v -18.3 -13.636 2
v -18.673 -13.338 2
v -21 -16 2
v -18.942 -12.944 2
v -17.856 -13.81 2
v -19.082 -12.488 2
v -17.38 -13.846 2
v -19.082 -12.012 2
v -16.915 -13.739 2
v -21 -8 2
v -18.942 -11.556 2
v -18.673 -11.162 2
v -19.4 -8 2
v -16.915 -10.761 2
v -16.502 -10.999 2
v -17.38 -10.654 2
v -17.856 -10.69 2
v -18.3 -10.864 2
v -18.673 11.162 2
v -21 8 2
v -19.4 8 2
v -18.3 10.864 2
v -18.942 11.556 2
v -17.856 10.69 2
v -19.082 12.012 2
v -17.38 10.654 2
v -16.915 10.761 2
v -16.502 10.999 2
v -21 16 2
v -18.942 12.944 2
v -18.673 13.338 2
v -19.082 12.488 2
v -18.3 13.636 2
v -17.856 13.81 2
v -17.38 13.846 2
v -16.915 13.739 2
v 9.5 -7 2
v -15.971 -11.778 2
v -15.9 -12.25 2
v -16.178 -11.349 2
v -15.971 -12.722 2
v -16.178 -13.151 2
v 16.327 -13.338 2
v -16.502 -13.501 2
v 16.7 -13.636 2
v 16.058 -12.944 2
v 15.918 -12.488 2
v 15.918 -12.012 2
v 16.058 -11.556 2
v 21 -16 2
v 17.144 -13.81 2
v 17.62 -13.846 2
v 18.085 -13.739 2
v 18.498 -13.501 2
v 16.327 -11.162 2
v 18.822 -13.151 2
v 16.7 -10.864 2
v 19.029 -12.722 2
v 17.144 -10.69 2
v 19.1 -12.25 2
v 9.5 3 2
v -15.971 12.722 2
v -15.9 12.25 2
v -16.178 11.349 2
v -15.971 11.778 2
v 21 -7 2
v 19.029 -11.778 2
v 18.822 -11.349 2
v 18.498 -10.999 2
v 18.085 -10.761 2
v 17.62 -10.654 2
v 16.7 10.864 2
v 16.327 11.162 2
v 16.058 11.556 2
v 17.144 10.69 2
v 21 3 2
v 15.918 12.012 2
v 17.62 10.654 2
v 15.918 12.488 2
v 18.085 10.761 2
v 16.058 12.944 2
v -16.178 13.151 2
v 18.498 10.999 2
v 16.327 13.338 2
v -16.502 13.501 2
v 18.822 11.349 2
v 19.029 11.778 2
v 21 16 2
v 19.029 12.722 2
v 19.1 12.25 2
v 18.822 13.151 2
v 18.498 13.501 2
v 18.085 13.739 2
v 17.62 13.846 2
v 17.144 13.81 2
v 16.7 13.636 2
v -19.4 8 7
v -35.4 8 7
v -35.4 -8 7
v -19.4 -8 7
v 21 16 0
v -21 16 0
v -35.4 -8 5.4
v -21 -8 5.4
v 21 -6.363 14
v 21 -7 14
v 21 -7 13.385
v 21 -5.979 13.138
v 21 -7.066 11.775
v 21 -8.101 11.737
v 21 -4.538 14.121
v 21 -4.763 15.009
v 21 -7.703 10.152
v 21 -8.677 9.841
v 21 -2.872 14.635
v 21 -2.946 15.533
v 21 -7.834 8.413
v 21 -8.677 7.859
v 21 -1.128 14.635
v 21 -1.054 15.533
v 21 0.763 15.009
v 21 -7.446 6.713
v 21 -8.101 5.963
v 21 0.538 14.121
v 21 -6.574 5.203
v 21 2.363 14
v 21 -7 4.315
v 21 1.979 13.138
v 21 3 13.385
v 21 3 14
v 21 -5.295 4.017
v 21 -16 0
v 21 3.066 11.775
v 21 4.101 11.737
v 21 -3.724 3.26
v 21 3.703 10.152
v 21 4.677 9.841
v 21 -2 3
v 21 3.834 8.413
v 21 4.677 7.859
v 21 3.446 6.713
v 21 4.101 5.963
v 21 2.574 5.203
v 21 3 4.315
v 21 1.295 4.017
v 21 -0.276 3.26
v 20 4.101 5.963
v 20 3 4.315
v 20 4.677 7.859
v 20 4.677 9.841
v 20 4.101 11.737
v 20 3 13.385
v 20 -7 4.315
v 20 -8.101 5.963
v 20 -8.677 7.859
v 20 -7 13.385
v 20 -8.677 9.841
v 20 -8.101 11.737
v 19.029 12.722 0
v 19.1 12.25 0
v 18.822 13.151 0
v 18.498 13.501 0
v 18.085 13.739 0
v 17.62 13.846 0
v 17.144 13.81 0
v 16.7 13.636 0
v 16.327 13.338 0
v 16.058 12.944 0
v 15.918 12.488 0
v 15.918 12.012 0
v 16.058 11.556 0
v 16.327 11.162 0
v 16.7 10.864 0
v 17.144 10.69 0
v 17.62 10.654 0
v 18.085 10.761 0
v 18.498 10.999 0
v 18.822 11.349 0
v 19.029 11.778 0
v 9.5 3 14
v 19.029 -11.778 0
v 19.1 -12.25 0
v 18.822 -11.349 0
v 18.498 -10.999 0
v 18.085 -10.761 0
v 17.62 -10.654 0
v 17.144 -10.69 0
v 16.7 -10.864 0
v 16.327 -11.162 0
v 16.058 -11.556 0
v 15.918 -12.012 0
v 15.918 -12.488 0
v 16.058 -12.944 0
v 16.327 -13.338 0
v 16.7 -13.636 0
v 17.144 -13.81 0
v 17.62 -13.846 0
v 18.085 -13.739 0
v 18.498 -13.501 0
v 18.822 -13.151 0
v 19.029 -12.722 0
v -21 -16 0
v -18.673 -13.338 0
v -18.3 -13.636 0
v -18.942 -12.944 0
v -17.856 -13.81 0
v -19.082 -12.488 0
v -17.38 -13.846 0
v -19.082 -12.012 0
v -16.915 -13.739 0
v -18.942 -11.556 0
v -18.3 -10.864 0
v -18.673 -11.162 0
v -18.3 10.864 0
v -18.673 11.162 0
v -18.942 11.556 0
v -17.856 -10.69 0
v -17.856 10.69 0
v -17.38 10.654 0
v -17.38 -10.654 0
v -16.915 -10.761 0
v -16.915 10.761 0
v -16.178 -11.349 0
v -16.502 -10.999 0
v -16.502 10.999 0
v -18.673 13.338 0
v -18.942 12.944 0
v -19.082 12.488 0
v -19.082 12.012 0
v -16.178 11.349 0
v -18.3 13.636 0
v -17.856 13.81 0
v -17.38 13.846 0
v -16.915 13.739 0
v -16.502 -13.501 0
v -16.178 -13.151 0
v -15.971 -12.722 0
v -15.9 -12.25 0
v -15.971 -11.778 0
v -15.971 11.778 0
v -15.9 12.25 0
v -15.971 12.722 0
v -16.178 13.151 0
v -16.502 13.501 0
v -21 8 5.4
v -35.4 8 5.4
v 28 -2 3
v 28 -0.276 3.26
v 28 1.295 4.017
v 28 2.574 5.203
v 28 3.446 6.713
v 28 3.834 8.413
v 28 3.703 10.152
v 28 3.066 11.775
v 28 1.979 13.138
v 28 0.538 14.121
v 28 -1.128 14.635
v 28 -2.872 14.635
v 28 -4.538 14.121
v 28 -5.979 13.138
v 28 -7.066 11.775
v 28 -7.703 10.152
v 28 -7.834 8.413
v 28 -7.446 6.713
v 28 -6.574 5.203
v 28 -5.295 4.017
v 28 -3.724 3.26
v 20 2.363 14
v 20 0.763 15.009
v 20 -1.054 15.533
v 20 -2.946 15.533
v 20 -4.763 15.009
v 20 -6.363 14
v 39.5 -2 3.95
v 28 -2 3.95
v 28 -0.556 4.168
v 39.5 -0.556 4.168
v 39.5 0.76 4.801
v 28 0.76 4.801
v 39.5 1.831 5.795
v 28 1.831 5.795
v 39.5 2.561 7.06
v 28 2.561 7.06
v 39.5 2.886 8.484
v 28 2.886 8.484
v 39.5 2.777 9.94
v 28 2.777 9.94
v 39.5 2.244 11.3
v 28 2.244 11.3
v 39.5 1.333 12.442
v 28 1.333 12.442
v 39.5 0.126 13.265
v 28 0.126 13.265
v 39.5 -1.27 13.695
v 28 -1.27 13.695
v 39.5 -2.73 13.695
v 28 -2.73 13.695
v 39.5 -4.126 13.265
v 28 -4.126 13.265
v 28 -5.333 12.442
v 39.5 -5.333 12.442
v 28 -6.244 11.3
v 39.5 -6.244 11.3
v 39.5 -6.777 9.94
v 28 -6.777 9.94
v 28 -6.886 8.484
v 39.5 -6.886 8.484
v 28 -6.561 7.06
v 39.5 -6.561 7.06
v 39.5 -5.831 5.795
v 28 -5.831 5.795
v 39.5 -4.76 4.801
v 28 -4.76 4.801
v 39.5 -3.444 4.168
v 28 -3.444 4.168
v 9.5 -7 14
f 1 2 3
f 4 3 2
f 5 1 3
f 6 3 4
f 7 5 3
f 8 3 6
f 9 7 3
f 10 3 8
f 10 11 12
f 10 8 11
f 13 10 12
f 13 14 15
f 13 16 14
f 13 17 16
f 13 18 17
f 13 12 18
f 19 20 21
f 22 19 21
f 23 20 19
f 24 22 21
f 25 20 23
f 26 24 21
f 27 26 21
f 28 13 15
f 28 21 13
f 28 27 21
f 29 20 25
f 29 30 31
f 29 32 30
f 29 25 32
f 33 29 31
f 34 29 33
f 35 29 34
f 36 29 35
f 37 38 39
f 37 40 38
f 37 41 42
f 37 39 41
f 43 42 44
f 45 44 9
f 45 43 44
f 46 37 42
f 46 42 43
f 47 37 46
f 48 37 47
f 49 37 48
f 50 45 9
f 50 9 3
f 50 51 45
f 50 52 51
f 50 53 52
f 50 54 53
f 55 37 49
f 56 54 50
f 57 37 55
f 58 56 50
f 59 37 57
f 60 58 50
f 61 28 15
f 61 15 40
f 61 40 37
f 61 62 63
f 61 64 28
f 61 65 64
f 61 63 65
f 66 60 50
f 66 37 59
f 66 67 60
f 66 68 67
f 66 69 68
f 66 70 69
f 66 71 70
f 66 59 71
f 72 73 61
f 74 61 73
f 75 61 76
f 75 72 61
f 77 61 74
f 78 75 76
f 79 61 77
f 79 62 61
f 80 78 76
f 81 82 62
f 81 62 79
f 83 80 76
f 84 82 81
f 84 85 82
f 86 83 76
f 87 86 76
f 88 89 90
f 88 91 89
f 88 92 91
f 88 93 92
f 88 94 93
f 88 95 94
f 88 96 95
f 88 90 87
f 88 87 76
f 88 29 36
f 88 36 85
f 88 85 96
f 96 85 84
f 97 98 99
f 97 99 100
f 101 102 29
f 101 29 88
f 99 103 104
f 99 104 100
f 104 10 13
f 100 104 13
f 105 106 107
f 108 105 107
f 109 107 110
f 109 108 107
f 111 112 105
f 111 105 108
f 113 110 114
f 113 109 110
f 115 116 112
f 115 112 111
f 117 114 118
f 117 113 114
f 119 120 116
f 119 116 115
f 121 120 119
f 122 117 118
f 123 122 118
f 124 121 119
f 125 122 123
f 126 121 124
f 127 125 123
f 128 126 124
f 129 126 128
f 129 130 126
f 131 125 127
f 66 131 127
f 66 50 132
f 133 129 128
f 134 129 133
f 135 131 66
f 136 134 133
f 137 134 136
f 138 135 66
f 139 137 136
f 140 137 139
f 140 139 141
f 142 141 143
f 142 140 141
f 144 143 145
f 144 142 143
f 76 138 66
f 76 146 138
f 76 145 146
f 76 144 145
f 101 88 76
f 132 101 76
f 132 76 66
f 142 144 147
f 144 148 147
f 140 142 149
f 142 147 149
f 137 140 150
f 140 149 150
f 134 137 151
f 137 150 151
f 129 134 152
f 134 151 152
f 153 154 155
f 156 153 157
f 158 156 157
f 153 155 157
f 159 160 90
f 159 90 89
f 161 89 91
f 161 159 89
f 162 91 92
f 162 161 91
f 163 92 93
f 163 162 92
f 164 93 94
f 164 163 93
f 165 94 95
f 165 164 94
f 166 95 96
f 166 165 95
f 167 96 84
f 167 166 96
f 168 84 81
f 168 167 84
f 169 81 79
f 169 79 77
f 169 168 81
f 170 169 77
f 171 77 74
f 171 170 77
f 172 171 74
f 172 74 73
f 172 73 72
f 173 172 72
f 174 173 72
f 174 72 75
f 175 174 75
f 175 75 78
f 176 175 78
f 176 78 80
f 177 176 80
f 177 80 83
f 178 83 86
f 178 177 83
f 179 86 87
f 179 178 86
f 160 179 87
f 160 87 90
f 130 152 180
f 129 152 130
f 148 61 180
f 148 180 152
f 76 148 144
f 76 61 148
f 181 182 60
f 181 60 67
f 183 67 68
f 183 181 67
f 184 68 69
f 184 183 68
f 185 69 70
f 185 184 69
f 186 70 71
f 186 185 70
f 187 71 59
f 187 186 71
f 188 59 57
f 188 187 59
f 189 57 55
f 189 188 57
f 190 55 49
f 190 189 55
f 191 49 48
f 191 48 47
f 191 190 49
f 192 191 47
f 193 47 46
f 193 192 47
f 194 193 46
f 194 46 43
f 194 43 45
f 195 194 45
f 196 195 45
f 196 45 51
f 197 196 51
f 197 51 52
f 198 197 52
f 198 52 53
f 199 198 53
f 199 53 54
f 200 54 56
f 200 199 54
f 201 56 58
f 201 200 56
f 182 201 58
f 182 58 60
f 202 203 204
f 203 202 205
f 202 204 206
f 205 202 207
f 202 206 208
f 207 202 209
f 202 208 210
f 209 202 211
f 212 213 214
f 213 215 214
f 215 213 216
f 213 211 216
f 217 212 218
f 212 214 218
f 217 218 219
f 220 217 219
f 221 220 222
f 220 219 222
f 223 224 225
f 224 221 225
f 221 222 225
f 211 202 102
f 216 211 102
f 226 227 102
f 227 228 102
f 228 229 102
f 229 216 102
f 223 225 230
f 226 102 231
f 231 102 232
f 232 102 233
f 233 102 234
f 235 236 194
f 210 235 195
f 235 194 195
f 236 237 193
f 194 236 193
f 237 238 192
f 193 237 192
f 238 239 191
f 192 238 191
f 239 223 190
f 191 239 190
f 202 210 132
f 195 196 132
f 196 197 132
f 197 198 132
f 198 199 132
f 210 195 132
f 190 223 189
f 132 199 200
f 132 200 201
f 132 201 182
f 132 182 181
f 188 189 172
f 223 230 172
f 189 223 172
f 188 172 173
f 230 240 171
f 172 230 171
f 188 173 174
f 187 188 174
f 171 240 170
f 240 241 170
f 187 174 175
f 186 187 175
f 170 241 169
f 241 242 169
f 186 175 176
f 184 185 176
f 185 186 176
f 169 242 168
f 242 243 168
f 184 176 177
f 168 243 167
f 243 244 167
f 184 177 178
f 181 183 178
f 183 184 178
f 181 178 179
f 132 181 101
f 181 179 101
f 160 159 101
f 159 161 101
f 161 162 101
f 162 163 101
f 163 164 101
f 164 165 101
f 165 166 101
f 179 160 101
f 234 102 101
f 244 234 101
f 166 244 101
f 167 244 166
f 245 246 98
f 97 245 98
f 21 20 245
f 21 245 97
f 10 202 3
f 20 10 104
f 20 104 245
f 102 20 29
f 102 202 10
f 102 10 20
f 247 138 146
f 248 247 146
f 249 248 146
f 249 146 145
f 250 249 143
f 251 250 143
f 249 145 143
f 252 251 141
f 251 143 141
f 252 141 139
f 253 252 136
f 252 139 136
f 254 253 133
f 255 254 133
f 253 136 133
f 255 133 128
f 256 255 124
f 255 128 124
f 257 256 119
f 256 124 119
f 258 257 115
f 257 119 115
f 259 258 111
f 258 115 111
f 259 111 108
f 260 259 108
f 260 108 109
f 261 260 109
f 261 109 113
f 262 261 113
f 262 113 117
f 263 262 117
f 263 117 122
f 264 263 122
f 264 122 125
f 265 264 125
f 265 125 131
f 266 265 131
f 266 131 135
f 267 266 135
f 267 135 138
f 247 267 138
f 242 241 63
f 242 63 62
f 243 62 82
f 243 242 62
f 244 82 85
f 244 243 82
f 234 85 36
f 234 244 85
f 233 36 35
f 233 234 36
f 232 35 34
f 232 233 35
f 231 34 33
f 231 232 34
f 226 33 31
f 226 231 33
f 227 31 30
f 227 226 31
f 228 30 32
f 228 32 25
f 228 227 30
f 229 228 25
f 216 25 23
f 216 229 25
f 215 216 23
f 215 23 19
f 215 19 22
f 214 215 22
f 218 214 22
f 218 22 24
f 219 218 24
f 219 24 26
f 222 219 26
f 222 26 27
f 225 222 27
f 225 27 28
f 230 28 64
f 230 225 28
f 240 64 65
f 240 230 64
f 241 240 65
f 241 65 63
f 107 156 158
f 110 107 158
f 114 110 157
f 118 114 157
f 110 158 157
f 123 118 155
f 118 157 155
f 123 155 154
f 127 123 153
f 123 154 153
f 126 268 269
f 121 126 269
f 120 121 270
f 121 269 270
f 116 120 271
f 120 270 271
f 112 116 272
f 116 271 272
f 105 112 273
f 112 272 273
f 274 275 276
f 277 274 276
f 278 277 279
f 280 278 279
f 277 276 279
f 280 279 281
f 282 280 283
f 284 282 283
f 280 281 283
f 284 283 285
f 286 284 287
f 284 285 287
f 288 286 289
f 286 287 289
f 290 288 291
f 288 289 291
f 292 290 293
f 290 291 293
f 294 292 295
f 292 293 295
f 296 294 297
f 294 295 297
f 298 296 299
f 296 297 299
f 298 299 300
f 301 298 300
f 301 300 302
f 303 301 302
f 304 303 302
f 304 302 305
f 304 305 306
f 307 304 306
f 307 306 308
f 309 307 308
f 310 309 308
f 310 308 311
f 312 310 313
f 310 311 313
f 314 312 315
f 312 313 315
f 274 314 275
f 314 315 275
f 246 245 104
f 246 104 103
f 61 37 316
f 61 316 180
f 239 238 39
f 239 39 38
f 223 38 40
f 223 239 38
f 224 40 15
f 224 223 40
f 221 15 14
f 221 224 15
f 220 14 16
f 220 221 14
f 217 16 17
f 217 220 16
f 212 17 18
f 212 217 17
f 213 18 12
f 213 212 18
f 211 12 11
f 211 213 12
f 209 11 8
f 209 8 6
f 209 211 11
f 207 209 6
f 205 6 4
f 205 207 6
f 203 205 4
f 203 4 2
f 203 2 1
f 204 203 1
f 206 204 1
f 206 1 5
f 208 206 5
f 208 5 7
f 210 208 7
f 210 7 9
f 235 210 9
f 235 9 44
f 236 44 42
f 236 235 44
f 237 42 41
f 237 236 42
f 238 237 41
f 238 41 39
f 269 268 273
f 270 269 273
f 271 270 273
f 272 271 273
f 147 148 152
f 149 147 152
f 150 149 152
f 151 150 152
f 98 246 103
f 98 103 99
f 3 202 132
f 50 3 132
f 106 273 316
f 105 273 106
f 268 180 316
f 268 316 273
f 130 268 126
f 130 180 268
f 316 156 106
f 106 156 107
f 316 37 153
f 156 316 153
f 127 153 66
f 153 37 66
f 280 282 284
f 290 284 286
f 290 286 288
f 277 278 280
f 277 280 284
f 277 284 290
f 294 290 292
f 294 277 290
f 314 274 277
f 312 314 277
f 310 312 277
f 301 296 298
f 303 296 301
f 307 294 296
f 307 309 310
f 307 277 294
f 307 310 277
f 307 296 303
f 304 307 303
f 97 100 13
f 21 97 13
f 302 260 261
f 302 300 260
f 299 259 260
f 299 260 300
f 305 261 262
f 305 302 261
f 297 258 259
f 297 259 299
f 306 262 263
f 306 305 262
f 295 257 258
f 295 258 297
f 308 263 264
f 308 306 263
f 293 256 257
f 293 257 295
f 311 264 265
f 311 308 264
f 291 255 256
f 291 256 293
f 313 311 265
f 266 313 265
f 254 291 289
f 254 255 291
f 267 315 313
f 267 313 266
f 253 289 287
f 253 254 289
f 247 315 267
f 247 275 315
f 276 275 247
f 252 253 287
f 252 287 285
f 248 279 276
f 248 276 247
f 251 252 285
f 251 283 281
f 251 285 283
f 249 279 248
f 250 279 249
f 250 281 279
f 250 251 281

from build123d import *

# Parameters (mm, degrees)
CROQUIS1_W              = 42
CROQUIS1_H              = 32
CROQUIS1_R              = 1.6
SALIENTE_EXTRUIR1_DEPTH = 2
CROQUIS2_W              = 11.5
CROQUIS2_H              = 10
SALIENTE_EXTRUIR2_DEPTH = 12
SALIENTE_EXTRUIR3_START = -1
CROQUIS3_R              = 6.75
SALIENTE_EXTRUIR3_DEPTH = 19.5
CORTAR_EXTRUIR1_START   = -18.5
CROQUIS4_R              = 6.75
CROQUIS4_R_2            = 5.85
CORTAR_EXTRUIR1_DEPTH   = 18.5
CORTAR_EXTRUIR2_START   = -11.5
CROQUIS5_R              = 5.85
CROQUIS5_R_2            = 4.9
CORTAR_EXTRUIR2_DEPTH   = 11.5
SALIENTE_EXTRUIR4_DEPTH = 8


with BuildPart() as part:
    # Croquis1 → Saliente-Extruir1 (new body)
    with BuildSketch(Plane.XY):
        Rectangle(CROQUIS1_W, CROQUIS1_H)
        with Locations((-17.5, 12.25)):
            Circle(CROQUIS1_R, mode=Mode.SUBTRACT)
        with Locations((-17.5, -12.25)):
            Circle(CROQUIS1_R, mode=Mode.SUBTRACT)
        with Locations((17.5, -12.25)):
            Circle(CROQUIS1_R, mode=Mode.SUBTRACT)
        with Locations((17.5, 12.25)):
            Circle(CROQUIS1_R, mode=Mode.SUBTRACT)
    extrude(amount=SALIENTE_EXTRUIR1_DEPTH)

    # Croquis2 → Saliente-Extruir2 (add)
    with BuildSketch(Plane.XY.offset(2)):
        with Locations((15.25, -2)):
            Rectangle(CROQUIS2_W, CROQUIS2_H)
    extrude(amount=SALIENTE_EXTRUIR2_DEPTH)

    # Croquis3 → Saliente-Extruir3 (add)
    with BuildSketch(Plane(origin=(21, 0, 0), x_dir=(0, 0, -1), z_dir=(1, 0, 0)).offset(SALIENTE_EXTRUIR3_START)):
        with Locations(Location((-8.85, -2, 0), (0, 0, 220.27389294))):
            Circle(CROQUIS3_R)
    extrude(amount=SALIENTE_EXTRUIR3_DEPTH)

    # Croquis4 → Cortar-Extruir1 (cut)
    with BuildSketch(Plane(origin=(39.5, 0, 0), x_dir=(0, 0, -1), z_dir=(1, 0, 0)).offset(CORTAR_EXTRUIR1_START)):
        with Locations((-8.85, -2)):
            Circle(CROQUIS4_R)
        with Locations((-8.85, -2)):
            Circle(CROQUIS4_R_2, mode=Mode.SUBTRACT)
    extrude(amount=CORTAR_EXTRUIR1_DEPTH, mode=Mode.SUBTRACT)

    # Croquis5 → Cortar-Extruir2 (cut)
    with BuildSketch(Plane(origin=(39.5, 0, 0), x_dir=(0, 0, -1), z_dir=(1, 0, 0)).offset(CORTAR_EXTRUIR2_START)):
        with Locations((-8.85, -2)):
            Circle(CROQUIS5_R)
        with Locations((-8.85, -2)):
            Circle(CROQUIS5_R_2, mode=Mode.SUBTRACT)
    extrude(amount=CORTAR_EXTRUIR2_DEPTH, mode=Mode.SUBTRACT)

    # Croquis7 → Saliente-Extruir4 (add, symmetric)
    with BuildSketch(Plane(origin=(0, 0, 0), x_dir=(1, 0, 0), z_dir=(0, 1, 0))):
        Polygon((-21, -2), (-21, -5.4), (-35.4, -5.4), (-35.4, -7), (-19.4, -7), (-19.4, -2), align=None)
    extrude(amount=SALIENTE_EXTRUIR4_DEPTH, both=True)


solid = part.part
